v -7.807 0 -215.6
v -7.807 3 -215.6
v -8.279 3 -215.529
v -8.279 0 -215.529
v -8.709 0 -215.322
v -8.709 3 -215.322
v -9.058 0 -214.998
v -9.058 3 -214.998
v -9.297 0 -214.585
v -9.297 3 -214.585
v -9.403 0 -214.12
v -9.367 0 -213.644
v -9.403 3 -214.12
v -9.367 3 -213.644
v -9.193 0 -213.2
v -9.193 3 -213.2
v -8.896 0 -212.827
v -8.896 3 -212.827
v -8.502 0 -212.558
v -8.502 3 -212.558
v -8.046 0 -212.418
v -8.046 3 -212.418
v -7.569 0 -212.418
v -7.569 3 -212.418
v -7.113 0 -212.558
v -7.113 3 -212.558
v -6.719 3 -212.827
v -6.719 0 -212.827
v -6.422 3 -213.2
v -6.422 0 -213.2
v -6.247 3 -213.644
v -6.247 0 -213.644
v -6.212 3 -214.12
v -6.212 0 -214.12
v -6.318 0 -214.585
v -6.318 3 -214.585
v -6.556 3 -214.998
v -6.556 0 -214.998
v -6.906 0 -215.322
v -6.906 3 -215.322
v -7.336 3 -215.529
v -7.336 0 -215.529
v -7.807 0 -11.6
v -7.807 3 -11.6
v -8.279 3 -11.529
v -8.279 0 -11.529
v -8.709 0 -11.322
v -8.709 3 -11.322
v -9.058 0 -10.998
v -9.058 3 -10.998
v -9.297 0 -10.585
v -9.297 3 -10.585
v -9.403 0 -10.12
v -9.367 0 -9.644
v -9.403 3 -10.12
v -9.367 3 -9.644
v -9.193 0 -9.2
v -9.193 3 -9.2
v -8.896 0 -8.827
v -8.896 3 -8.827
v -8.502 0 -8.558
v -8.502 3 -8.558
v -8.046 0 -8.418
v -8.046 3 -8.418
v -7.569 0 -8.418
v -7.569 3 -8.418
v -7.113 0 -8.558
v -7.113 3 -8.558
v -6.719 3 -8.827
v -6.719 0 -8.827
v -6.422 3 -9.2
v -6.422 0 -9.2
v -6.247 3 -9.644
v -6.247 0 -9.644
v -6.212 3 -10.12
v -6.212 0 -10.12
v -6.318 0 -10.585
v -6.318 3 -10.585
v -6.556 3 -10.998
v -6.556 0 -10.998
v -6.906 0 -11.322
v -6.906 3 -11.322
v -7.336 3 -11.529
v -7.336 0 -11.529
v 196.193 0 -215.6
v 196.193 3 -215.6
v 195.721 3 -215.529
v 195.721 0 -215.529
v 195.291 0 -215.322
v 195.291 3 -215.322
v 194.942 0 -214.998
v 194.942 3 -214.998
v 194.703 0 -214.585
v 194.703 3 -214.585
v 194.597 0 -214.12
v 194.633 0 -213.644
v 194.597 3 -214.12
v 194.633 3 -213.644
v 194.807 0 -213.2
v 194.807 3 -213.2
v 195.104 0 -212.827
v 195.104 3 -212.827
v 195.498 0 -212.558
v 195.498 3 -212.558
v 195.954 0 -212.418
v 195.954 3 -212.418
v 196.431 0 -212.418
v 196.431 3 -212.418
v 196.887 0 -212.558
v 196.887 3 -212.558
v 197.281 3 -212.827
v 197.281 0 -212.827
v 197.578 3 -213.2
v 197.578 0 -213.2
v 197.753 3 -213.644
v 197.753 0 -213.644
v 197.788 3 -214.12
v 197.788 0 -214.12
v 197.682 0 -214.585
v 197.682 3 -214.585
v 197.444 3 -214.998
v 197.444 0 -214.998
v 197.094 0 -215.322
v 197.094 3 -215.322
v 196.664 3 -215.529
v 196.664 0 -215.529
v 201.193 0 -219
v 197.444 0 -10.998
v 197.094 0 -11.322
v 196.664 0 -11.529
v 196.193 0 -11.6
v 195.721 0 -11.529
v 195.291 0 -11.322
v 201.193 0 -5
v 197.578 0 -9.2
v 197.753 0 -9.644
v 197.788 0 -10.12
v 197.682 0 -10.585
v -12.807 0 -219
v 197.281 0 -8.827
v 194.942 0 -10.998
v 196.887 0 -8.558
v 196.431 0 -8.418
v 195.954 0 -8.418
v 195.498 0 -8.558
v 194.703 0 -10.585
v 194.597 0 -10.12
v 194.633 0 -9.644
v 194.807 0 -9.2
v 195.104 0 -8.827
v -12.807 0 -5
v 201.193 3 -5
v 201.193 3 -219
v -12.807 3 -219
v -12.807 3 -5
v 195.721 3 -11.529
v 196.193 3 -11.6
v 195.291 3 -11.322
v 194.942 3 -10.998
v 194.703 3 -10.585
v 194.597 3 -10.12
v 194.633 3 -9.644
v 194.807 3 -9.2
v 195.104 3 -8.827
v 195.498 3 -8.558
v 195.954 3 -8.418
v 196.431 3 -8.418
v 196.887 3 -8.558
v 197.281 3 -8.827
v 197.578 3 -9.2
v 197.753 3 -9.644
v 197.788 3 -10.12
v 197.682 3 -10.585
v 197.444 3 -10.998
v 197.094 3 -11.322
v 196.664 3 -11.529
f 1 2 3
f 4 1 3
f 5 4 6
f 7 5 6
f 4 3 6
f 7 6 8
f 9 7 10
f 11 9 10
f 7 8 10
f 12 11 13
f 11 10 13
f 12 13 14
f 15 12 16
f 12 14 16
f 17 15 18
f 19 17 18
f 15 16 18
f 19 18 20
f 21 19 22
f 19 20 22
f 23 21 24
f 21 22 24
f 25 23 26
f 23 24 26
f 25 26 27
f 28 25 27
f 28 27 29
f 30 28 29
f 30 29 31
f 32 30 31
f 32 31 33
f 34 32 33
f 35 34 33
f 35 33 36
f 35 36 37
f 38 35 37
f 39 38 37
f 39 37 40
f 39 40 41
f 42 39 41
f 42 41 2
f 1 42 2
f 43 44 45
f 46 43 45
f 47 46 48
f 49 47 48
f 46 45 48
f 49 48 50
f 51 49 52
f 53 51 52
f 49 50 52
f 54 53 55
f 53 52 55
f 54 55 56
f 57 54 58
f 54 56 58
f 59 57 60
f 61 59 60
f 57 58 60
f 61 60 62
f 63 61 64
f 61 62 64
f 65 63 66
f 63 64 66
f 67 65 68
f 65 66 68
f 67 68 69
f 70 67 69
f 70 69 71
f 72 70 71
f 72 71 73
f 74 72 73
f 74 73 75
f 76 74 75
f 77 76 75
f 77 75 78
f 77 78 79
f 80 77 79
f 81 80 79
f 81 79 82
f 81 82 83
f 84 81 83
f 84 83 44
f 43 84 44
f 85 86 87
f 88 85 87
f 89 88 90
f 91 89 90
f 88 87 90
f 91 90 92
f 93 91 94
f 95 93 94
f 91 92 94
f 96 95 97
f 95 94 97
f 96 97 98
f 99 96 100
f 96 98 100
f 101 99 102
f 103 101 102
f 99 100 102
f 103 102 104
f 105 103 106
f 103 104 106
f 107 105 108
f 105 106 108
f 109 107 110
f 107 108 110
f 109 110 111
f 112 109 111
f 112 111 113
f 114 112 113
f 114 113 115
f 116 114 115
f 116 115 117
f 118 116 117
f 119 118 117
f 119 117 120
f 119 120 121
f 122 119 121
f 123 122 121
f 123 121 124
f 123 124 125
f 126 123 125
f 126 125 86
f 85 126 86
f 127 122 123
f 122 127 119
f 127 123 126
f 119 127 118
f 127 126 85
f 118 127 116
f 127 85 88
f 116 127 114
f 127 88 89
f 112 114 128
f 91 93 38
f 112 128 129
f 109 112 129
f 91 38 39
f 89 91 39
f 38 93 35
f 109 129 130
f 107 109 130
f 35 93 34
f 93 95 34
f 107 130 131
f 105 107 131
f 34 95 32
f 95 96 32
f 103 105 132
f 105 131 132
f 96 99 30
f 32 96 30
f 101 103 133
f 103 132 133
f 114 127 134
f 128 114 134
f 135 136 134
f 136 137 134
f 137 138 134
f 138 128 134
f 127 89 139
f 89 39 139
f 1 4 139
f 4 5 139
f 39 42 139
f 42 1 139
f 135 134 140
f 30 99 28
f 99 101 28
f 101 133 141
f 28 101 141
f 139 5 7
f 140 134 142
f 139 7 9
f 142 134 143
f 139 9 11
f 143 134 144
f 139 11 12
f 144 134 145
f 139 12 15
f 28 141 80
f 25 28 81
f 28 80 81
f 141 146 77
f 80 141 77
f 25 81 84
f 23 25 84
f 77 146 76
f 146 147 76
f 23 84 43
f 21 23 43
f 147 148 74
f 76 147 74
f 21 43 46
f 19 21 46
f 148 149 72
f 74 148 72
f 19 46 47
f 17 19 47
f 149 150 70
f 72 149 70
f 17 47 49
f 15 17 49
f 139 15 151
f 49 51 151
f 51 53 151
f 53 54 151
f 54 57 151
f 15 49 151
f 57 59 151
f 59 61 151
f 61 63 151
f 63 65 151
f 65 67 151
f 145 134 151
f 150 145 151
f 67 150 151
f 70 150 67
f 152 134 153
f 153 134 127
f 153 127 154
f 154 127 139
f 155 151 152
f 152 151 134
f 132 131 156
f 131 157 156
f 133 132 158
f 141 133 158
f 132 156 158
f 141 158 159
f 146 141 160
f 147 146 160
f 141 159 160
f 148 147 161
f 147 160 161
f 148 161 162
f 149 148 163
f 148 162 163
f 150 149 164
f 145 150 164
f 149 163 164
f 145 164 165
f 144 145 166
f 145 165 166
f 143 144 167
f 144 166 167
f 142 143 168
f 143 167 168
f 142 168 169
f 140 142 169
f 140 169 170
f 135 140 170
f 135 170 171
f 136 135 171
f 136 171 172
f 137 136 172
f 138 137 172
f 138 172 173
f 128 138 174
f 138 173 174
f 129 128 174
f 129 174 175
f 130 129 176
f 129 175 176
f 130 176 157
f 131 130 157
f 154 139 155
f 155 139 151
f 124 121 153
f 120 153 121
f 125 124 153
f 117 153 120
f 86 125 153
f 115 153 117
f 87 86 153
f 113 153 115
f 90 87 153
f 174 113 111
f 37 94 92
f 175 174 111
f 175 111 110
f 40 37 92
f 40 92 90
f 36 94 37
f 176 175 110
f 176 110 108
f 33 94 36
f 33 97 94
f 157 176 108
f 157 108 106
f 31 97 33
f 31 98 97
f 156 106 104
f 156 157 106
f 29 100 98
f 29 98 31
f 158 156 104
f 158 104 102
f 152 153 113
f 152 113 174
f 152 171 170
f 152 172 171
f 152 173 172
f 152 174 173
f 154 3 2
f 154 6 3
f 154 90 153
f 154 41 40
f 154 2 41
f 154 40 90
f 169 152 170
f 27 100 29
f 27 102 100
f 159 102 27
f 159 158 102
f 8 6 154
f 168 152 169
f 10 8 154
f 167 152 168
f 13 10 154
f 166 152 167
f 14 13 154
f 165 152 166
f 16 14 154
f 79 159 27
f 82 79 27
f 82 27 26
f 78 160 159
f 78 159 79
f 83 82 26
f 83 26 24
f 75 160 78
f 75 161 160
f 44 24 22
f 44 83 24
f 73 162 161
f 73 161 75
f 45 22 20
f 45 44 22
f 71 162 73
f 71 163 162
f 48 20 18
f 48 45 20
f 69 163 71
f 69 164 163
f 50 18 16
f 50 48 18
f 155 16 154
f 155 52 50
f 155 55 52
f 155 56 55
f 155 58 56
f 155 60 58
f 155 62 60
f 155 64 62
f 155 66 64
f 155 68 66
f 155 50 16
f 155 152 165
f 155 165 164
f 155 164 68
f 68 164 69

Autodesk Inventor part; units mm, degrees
ref_plane "YZ Plane" through (0, 0, 0) normal (1, 0, 0) x (0, 1, 0)
ref_plane "XZ Plane" through (0, 0, 0) normal (0, 1, 0) x (-1, 0, 0)
ref_plane "XY Plane" through (0, 0, 0) normal (0, 0, 1) x (1, 0, 0)
sketch "Sketch1" plane through (0, 0, 0) normal (0, 1, 0) x (-1, 0, 0)
  line L0 (12.8073, -5) -> (-201.1927, -5)
  line L1 (-201.1927, -5) -> (-201.1927, -219)
  line L2 (-201.1927, -219) -> (12.8073, -219)
  line L3 (12.8073, -219) -> (12.8073, -5)
  line L4 (-194.2832, -13.9005) -> (3.3163, -13.9005) construction
  line L5 (3.3163, -13.9005) -> (3.3163, -210.6364) construction
  line L6 (3.3163, -210.6364) -> (-194.2832, -210.6364) construction
  line L7 (-194.2832, -210.6364) -> (-194.2832, -13.9005) construction
  point P0 (0, 0)
  point P1 (7.8073, -10)
  point P2 (7.8073, -214)
  point P3 (-196.1927, -214)
  point P4 (-196.1927, -10)
  dimension "d0" = 214
  dimension "d1" = 214
  dimension "d2" = 209
  dimension "d3" = 5
  dimension "d4" = 5
  dimension "d5" = 5
  dimension "d6" = 5
  dimension "d7" = 5
  dimension "d8" = 5
  dimension "d9" = 5
extrude "Extrusion1" add sketch "Sketch1" along normal blind 3
hole "Hole1" at (-7.8073, 0, -10) at (-7.8073, 0, -214) at (196.1927, 0, -214) at (196.1927, 0, -10) direction (0, 1, 0) diameter 3.2 end through all
properties part number "HeatedBed"
